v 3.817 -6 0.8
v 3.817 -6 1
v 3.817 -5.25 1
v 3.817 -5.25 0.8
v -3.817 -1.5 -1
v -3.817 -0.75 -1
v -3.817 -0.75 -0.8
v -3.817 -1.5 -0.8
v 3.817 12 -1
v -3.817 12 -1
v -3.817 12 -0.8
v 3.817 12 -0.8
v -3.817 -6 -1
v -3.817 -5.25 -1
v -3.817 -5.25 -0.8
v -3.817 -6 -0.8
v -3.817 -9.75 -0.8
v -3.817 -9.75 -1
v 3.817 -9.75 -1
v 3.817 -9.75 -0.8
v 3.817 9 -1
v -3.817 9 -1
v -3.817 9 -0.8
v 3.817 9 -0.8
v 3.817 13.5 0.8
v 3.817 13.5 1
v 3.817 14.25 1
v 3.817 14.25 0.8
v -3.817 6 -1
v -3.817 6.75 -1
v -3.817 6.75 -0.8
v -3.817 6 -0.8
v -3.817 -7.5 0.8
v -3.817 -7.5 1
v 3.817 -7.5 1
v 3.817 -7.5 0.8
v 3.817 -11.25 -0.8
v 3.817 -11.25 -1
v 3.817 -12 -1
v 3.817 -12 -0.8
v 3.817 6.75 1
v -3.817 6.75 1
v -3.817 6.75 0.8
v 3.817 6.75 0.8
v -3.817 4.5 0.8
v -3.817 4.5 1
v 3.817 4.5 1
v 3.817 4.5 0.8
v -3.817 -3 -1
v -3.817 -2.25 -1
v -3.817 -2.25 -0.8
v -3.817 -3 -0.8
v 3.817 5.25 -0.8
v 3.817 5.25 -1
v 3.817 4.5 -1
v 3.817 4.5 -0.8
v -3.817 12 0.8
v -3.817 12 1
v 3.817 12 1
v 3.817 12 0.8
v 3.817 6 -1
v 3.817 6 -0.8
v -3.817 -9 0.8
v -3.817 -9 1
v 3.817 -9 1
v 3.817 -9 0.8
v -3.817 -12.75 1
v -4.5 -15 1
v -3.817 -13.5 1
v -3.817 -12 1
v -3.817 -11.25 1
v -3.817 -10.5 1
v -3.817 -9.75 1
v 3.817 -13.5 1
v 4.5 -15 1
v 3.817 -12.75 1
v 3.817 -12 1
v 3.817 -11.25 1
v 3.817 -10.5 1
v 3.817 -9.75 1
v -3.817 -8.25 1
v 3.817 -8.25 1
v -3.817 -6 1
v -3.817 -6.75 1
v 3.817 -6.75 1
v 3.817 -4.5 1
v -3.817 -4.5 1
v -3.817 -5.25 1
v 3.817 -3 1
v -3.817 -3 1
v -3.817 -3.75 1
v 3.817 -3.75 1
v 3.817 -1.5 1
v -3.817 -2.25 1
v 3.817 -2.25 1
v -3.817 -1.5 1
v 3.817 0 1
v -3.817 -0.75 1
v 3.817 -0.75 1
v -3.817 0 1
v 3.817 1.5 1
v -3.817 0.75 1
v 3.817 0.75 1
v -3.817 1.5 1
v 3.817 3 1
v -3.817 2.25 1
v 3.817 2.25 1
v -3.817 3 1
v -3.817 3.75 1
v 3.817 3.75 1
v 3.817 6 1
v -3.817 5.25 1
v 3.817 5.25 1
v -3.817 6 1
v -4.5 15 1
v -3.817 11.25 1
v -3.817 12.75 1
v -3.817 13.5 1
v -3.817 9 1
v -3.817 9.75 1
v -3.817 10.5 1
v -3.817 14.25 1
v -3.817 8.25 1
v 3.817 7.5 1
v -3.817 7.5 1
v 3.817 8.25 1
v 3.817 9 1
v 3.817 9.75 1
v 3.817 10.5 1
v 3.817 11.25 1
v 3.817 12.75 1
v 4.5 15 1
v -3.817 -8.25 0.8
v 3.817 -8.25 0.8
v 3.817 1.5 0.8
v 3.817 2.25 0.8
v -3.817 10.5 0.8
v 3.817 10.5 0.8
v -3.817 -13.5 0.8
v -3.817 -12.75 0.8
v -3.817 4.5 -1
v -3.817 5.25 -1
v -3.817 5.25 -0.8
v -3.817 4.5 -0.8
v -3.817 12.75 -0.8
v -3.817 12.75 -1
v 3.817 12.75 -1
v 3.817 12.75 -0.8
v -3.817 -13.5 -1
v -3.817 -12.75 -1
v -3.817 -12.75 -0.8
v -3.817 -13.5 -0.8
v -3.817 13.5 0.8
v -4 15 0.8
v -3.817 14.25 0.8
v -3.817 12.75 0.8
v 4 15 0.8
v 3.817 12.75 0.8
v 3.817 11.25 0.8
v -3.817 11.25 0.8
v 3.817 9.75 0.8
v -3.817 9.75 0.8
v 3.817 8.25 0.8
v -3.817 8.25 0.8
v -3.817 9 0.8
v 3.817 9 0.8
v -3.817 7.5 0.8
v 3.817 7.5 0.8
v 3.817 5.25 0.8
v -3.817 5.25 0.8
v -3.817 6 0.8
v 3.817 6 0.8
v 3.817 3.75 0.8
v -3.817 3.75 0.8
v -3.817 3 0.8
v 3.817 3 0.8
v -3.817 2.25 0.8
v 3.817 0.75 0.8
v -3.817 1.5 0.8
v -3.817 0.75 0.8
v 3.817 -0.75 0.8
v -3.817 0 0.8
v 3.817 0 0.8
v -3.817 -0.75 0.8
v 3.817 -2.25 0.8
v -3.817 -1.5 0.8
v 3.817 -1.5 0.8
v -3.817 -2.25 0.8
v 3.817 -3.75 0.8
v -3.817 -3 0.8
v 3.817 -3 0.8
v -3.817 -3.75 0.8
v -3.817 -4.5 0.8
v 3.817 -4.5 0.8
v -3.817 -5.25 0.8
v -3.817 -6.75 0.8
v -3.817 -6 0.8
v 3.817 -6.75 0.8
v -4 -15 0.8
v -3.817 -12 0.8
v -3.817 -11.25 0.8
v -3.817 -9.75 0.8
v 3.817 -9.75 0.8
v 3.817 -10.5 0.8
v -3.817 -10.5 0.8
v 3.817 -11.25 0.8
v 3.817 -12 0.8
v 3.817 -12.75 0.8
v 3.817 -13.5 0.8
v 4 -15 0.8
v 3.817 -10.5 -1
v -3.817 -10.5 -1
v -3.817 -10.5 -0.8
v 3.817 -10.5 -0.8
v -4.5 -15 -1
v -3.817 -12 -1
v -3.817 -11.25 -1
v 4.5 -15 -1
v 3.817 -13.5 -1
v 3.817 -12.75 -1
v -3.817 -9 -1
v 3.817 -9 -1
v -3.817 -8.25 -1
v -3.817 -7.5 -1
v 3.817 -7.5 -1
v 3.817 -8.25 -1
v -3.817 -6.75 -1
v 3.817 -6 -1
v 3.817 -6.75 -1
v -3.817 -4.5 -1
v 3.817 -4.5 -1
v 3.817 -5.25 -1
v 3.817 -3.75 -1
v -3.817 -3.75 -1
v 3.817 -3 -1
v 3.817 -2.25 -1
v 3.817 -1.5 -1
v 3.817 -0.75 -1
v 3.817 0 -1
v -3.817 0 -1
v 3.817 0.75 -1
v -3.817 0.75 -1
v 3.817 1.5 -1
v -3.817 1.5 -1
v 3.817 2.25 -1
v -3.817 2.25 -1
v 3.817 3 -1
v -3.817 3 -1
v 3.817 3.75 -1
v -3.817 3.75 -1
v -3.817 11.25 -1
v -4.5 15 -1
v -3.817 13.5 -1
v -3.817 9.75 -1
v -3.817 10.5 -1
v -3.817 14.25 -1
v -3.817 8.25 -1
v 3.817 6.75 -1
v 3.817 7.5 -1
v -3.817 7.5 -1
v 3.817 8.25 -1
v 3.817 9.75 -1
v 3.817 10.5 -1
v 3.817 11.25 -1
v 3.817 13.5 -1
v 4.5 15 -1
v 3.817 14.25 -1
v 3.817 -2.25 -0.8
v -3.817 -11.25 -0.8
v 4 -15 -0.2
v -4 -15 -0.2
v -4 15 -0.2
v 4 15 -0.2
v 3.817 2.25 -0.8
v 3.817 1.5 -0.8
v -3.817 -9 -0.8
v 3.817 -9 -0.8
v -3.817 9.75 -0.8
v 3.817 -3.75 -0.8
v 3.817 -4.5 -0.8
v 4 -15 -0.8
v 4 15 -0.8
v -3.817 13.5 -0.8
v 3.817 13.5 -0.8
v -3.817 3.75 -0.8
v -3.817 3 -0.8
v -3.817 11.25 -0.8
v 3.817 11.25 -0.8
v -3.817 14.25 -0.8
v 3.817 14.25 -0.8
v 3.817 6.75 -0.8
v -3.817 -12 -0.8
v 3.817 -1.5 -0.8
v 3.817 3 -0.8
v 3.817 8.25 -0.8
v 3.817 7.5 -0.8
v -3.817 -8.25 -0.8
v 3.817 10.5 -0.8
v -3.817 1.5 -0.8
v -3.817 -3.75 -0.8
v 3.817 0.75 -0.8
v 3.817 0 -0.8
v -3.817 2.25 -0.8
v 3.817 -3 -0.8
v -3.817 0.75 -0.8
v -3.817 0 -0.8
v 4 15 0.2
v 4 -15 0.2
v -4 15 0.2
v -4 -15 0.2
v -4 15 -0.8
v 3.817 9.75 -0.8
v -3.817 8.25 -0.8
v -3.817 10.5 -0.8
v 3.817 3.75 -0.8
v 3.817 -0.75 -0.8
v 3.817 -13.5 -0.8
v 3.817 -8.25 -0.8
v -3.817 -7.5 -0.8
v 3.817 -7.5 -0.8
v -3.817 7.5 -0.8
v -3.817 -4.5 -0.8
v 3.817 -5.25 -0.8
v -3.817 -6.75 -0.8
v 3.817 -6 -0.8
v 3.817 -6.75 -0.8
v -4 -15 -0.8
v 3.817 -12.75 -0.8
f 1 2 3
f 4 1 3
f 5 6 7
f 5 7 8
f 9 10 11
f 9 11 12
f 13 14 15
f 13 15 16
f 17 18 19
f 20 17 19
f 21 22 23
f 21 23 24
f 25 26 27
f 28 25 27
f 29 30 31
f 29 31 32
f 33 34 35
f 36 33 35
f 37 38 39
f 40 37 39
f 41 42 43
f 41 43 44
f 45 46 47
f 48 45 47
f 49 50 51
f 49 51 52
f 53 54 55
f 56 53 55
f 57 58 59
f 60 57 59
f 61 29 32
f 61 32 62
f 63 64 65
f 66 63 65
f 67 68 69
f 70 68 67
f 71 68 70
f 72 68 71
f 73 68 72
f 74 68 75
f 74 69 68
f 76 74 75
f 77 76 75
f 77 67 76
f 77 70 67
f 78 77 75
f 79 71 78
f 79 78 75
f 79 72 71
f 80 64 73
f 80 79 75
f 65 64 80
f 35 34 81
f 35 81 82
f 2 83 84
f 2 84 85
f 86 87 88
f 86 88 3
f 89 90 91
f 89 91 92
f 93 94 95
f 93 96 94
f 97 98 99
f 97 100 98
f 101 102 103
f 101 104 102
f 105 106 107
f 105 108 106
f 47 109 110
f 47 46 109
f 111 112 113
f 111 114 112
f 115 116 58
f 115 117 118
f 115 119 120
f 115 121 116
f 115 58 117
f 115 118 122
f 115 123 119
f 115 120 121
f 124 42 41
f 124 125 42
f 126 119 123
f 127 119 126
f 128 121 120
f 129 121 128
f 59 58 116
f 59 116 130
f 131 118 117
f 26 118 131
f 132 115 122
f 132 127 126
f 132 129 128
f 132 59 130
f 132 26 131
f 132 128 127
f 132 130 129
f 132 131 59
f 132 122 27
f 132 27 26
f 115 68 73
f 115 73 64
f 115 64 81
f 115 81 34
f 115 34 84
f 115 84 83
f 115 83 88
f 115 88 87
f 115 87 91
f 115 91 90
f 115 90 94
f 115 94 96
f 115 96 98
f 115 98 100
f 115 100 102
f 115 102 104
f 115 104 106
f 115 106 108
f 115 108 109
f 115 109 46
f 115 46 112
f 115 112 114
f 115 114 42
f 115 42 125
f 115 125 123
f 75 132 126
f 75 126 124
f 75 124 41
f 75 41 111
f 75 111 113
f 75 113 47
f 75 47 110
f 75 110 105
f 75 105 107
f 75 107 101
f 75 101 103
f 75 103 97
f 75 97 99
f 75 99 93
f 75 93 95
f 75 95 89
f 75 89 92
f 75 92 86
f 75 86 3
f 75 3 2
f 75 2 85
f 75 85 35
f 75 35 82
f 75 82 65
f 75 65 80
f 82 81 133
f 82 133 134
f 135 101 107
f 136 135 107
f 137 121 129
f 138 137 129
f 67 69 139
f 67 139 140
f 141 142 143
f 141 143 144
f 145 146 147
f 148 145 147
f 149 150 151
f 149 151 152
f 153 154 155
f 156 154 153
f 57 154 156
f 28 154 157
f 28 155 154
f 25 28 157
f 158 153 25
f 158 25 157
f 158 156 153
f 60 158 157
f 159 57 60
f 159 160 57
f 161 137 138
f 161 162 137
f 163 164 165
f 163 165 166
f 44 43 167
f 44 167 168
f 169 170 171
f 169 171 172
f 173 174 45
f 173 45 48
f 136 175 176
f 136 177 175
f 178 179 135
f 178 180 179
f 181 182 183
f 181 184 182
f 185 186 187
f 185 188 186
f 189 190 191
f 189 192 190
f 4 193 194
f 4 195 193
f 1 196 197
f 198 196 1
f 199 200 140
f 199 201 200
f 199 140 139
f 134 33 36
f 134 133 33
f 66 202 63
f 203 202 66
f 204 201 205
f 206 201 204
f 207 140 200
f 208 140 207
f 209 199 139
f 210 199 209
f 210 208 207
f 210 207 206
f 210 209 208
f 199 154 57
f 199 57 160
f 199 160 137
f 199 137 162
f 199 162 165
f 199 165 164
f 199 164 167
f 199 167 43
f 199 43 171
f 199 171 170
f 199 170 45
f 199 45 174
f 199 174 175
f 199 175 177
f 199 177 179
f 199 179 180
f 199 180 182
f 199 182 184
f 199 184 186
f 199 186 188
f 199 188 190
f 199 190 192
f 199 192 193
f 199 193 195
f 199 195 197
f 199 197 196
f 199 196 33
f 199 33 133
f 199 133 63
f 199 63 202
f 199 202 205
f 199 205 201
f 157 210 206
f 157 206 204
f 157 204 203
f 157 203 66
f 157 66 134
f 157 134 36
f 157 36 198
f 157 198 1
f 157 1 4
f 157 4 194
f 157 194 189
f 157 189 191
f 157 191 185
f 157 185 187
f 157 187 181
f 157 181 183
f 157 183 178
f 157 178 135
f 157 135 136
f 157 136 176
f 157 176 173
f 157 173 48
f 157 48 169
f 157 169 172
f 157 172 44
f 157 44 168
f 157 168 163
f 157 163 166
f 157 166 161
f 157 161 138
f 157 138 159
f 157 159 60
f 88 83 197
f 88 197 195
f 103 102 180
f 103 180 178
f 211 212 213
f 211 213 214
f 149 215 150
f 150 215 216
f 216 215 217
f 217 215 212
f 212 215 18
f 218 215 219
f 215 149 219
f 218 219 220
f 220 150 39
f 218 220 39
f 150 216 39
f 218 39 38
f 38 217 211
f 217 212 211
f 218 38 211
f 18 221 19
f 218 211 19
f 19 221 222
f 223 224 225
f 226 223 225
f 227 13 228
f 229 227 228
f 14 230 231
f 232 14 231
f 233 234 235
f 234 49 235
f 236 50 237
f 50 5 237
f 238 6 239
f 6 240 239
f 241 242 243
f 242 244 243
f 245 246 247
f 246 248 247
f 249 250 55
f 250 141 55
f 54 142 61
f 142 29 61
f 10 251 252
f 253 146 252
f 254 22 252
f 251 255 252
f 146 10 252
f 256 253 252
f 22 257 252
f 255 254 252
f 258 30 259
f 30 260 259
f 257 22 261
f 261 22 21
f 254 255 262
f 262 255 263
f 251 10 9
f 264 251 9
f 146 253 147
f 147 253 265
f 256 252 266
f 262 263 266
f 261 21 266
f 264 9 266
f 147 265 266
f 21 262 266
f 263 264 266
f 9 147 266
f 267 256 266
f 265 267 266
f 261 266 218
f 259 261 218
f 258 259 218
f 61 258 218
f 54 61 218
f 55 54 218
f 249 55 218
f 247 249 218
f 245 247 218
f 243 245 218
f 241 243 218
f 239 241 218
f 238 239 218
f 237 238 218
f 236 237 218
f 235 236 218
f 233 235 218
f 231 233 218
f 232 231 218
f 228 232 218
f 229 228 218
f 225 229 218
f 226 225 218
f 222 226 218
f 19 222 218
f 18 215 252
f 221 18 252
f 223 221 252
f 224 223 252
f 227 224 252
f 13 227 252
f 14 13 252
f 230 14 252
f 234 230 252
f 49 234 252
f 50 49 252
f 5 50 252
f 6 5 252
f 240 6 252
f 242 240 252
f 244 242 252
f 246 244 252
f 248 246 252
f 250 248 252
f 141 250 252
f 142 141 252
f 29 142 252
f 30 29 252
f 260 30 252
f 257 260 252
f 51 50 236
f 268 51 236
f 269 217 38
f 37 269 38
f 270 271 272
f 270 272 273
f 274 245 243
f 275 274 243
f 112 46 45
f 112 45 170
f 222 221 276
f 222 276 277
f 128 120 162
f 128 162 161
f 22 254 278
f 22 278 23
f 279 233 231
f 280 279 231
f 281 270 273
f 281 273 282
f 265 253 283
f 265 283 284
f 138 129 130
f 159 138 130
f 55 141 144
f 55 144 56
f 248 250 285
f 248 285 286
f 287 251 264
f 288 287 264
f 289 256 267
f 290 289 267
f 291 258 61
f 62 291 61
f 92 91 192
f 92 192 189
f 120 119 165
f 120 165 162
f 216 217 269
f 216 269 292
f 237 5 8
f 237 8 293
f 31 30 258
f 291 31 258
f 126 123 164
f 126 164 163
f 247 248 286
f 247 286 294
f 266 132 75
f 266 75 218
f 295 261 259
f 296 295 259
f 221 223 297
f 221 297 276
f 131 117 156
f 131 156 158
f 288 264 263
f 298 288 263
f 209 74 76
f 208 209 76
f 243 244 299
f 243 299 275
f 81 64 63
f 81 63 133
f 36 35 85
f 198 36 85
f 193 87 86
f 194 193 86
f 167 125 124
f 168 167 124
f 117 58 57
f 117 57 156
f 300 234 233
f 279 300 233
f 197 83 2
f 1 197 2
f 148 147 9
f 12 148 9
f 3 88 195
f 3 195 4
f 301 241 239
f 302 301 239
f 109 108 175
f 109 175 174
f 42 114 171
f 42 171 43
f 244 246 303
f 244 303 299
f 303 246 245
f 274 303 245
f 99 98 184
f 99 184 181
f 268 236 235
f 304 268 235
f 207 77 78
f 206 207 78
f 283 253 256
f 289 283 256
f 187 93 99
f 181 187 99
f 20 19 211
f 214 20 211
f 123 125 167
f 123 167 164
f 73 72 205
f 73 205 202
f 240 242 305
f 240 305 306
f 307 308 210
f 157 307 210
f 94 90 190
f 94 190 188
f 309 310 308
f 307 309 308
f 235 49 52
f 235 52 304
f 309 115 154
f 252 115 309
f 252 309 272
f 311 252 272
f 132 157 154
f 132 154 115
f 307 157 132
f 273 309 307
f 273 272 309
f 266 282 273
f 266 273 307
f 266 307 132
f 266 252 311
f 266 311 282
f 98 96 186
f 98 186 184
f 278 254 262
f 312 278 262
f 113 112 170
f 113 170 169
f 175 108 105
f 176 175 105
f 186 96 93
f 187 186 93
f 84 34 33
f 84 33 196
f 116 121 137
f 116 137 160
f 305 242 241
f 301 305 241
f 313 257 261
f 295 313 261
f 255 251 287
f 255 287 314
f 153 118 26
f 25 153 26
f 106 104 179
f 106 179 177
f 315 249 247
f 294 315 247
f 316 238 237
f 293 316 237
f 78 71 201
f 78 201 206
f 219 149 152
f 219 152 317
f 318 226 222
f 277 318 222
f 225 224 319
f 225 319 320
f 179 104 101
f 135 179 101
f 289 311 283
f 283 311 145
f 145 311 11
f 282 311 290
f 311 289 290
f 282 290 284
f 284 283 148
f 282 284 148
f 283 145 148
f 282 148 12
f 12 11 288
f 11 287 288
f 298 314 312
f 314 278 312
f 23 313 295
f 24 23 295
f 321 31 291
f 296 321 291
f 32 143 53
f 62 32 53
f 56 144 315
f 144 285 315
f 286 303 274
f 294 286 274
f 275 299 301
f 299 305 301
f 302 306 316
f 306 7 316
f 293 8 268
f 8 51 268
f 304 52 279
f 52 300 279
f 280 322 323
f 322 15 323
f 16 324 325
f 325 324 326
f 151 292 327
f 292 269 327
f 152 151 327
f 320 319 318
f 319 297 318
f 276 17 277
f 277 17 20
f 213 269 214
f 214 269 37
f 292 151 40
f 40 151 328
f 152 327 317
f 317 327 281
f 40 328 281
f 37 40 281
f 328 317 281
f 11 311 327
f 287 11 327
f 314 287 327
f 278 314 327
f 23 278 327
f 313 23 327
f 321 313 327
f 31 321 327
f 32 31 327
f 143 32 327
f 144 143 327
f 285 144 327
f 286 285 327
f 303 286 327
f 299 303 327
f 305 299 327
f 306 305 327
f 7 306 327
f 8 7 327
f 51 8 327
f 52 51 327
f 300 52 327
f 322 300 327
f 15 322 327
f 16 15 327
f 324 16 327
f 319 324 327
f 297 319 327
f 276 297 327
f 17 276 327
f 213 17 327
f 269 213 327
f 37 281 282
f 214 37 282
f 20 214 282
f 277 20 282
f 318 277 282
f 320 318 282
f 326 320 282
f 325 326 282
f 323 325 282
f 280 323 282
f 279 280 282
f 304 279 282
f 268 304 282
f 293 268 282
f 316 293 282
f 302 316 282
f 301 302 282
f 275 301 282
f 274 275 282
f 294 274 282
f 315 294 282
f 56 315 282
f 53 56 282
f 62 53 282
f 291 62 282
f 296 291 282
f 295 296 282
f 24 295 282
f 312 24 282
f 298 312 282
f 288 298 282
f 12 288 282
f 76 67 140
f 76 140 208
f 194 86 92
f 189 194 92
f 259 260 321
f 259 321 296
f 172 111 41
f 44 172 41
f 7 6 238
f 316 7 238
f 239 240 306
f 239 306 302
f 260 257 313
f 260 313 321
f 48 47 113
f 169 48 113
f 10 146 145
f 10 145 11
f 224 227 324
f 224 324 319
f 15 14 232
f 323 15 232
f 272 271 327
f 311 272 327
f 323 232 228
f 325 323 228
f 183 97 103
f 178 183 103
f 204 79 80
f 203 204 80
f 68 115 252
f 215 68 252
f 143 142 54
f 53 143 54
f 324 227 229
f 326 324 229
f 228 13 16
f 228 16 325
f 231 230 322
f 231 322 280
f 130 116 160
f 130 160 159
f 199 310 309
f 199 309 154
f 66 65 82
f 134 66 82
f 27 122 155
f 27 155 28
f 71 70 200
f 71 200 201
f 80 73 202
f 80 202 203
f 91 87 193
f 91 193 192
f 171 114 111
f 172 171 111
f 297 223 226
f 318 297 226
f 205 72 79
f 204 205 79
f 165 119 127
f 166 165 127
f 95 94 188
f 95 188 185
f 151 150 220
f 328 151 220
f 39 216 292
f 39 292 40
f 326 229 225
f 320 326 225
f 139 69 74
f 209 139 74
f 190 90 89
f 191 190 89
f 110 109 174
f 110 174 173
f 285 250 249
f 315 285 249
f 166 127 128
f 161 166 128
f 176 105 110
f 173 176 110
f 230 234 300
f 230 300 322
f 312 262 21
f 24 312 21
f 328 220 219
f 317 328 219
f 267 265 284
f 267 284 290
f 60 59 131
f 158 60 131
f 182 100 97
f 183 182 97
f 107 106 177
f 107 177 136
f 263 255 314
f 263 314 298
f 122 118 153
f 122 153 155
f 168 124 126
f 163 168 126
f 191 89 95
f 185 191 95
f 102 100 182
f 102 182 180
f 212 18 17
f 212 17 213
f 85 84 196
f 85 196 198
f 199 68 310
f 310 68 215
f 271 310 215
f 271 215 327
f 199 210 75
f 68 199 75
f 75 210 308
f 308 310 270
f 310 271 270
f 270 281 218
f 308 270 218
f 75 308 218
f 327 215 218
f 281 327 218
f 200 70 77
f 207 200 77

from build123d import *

# Parameters (mm, degrees)
SKETCH1_W                = 9
SKETCH1_H                = 2
BOSS_EXTRUDE1_DEPTH      = 15
CUT_EXTRUDE1_START       = -31
SKETCH2_W                = 8
SKETCH2_H                = 0.6
CUT_EXTRUDE1_DEPTH       = 32
SKETCH3_W                = 7.634272068
SKETCH3_H                = 0.75
CUT_EXTRUDE2_DEPTH       = 0.2
LPATTERN1_COUNT          = 19
LPATTERN1_PITCH          = 1.5
MIRROR2_COPY_1_SKETCH_W  = 7.634272068
MIRROR2_COPY_1_SKETCH_H  = 0.75
MIRROR2_COPY_1_DEPTH     = 0.2
MIRROR2_COPY_2_SKETCH_W  = 7.634272068
MIRROR2_COPY_2_SKETCH_H  = 0.75
MIRROR2_COPY_2_DEPTH     = 0.2
MIRROR2_COPY_3_SKETCH_W  = 7.634272068
MIRROR2_COPY_3_SKETCH_H  = 0.75
MIRROR2_COPY_3_DEPTH     = 0.2
MIRROR2_COPY_4_SKETCH_W  = 7.634272068
MIRROR2_COPY_4_SKETCH_H  = 0.75
MIRROR2_COPY_4_DEPTH     = 0.2
MIRROR2_COPY_5_SKETCH_W  = 7.634272068
MIRROR2_COPY_5_SKETCH_H  = 0.75
MIRROR2_COPY_5_DEPTH     = 0.2
MIRROR2_COPY_6_SKETCH_W  = 7.634272068
MIRROR2_COPY_6_SKETCH_H  = 0.75
MIRROR2_COPY_6_DEPTH     = 0.2
MIRROR2_COPY_7_SKETCH_W  = 7.634272068
MIRROR2_COPY_7_SKETCH_H  = 0.75
MIRROR2_COPY_7_DEPTH     = 0.2
MIRROR2_COPY_8_SKETCH_W  = 7.634272068
MIRROR2_COPY_8_SKETCH_H  = 0.75
MIRROR2_COPY_8_DEPTH     = 0.2
MIRROR2_COPY_9_SKETCH_W  = 7.634272068
MIRROR2_COPY_9_SKETCH_H  = 0.75
MIRROR2_COPY_9_DEPTH     = 0.2
MIRROR2_COPY_10_SKETCH_W = 7.634272068
MIRROR2_COPY_10_SKETCH_H = 0.75
MIRROR2_COPY_10_DEPTH    = 0.2
MIRROR2_COPY_11_SKETCH_W = 7.634272068
MIRROR2_COPY_11_SKETCH_H = 0.75
MIRROR2_COPY_11_DEPTH    = 0.2
MIRROR2_COPY_12_SKETCH_W = 7.634272068
MIRROR2_COPY_12_SKETCH_H = 0.75
MIRROR2_COPY_12_DEPTH    = 0.2
MIRROR2_COPY_13_SKETCH_W = 7.634272068
MIRROR2_COPY_13_SKETCH_H = 0.75
MIRROR2_COPY_13_DEPTH    = 0.2
MIRROR2_COPY_14_SKETCH_W = 7.634272068
MIRROR2_COPY_14_SKETCH_H = 0.75
MIRROR2_COPY_14_DEPTH    = 0.2
MIRROR2_COPY_15_SKETCH_W = 7.634272068
MIRROR2_COPY_15_SKETCH_H = 0.75
MIRROR2_COPY_15_DEPTH    = 0.2
MIRROR2_COPY_16_SKETCH_W = 7.634272068
MIRROR2_COPY_16_SKETCH_H = 0.75
MIRROR2_COPY_16_DEPTH    = 0.2
MIRROR2_COPY_17_SKETCH_W = 7.634272068
MIRROR2_COPY_17_SKETCH_H = 0.75
MIRROR2_COPY_17_DEPTH    = 0.2
MIRROR2_COPY_18_SKETCH_W = 7.634272068
MIRROR2_COPY_18_SKETCH_H = 0.75
MIRROR2_COPY_18_DEPTH    = 0.2


with BuildPart() as part:
    # Sketch1 → Boss-Extrude1 (new body, symmetric)
    with BuildSketch(Plane(origin=(0, 0, 0), x_dir=(1, 0, 0), z_dir=(0, 1, 0))):
        Rectangle(SKETCH1_W, SKETCH1_H)
    extrude(amount=BOSS_EXTRUDE1_DEPTH, both=True)

    # Sketch2 → Cut-Extrude1 (cut)
    with BuildSketch(Plane(origin=(0, 15, 0), x_dir=(1, 0, 0), z_dir=(0, 1, 0)).offset(CUT_EXTRUDE1_START)):
        with Locations((0, 0.5)):
            Rectangle(SKETCH2_W, SKETCH2_H)
    cut_extrude1 = extrude(amount=CUT_EXTRUDE1_DEPTH, mode=Mode.SUBTRACT)

    # Mirror1: Cut-Extrude1 across plane
    add(cut_extrude1.mirror(Plane.XY), mode=Mode.SUBTRACT)

    # Sketch3 → Cut-Extrude2 (cut)
    with BuildSketch(Plane.XY.offset(1)):
        with Locations((0, 13.875)):
            Rectangle(SKETCH3_W, SKETCH3_H)
    cut_extrude2 = extrude(amount=-CUT_EXTRUDE2_DEPTH, mode=Mode.SUBTRACT)

    # LPattern1: Cut-Extrude2 ×19
    with Locations(*[(0, -i * LPATTERN1_PITCH, 0) for i in range(1, LPATTERN1_COUNT)]):
        add(cut_extrude2, mode=Mode.SUBTRACT)

    # Mirror2: Cut-Extrude2 across plane
    add(cut_extrude2.mirror(Plane.XY), mode=Mode.SUBTRACT)

    # Mirror2 copy 1 sketch → Mirror2 copy 1 (cut)
    with BuildSketch(Plane(origin=(0, -1.5, -1), x_dir=(1, 0, 0), z_dir=(0, 0, -1))):
        with Locations((0, -13.875)):
            Rectangle(MIRROR2_COPY_1_SKETCH_W, MIRROR2_COPY_1_SKETCH_H)
    extrude(amount=-MIRROR2_COPY_1_DEPTH, mode=Mode.SUBTRACT)

    # Mirror2 copy 2 sketch → Mirror2 copy 2 (cut)
    with BuildSketch(Plane(origin=(0, -3, -1), x_dir=(1, 0, 0), z_dir=(0, 0, -1))):
        with Locations((0, -13.875)):
            Rectangle(MIRROR2_COPY_2_SKETCH_W, MIRROR2_COPY_2_SKETCH_H)
    extrude(amount=-MIRROR2_COPY_2_DEPTH, mode=Mode.SUBTRACT)

    # Mirror2 copy 3 sketch → Mirror2 copy 3 (cut)
    with BuildSketch(Plane(origin=(0, -4.5, -1), x_dir=(1, 0, 0), z_dir=(0, 0, -1))):
        with Locations((0, -13.875)):
            Rectangle(MIRROR2_COPY_3_SKETCH_W, MIRROR2_COPY_3_SKETCH_H)
    extrude(amount=-MIRROR2_COPY_3_DEPTH, mode=Mode.SUBTRACT)

    # Mirror2 copy 4 sketch → Mirror2 copy 4 (cut)
    with BuildSketch(Plane(origin=(0, -6, -1), x_dir=(1, 0, 0), z_dir=(0, 0, -1))):
        with Locations((0, -13.875)):
            Rectangle(MIRROR2_COPY_4_SKETCH_W, MIRROR2_COPY_4_SKETCH_H)
    extrude(amount=-MIRROR2_COPY_4_DEPTH, mode=Mode.SUBTRACT)

    # Mirror2 copy 5 sketch → Mirror2 copy 5 (cut)
    with BuildSketch(Plane(origin=(0, -7.5, -1), x_dir=(1, 0, 0), z_dir=(0, 0, -1))):
        with Locations((0, -13.875)):
            Rectangle(MIRROR2_COPY_5_SKETCH_W, MIRROR2_COPY_5_SKETCH_H)
    extrude(amount=-MIRROR2_COPY_5_DEPTH, mode=Mode.SUBTRACT)

    # Mirror2 copy 6 sketch → Mirror2 copy 6 (cut)
    with BuildSketch(Plane(origin=(0, -9, -1), x_dir=(1, 0, 0), z_dir=(0, 0, -1))):
        with Locations((0, -13.875)):
            Rectangle(MIRROR2_COPY_6_SKETCH_W, MIRROR2_COPY_6_SKETCH_H)
    extrude(amount=-MIRROR2_COPY_6_DEPTH, mode=Mode.SUBTRACT)

    # Mirror2 copy 7 sketch → Mirror2 copy 7 (cut)
    with BuildSketch(Plane(origin=(0, -10.5, -1), x_dir=(1, 0, 0), z_dir=(0, 0, -1))):
        with Locations((0, -13.875)):
            Rectangle(MIRROR2_COPY_7_SKETCH_W, MIRROR2_COPY_7_SKETCH_H)
    extrude(amount=-MIRROR2_COPY_7_DEPTH, mode=Mode.SUBTRACT)

    # Mirror2 copy 8 sketch → Mirror2 copy 8 (cut)
    with BuildSketch(Plane(origin=(0, -12, -1), x_dir=(1, 0, 0), z_dir=(0, 0, -1))):
        with Locations((0, -13.875)):
            Rectangle(MIRROR2_COPY_8_SKETCH_W, MIRROR2_COPY_8_SKETCH_H)
    extrude(amount=-MIRROR2_COPY_8_DEPTH, mode=Mode.SUBTRACT)

    # Mirror2 copy 9 sketch → Mirror2 copy 9 (cut)
    with BuildSketch(Plane(origin=(0, -13.5, -1), x_dir=(1, 0, 0), z_dir=(0, 0, -1))):
        with Locations((0, -13.875)):
            Rectangle(MIRROR2_COPY_9_SKETCH_W, MIRROR2_COPY_9_SKETCH_H)
    extrude(amount=-MIRROR2_COPY_9_DEPTH, mode=Mode.SUBTRACT)

    # Mirror2 copy 10 sketch → Mirror2 copy 10 (cut)
    with BuildSketch(Plane(origin=(0, -15, -1), x_dir=(1, 0, 0), z_dir=(0, 0, -1))):
        with Locations((0, -13.875)):
            Rectangle(MIRROR2_COPY_10_SKETCH_W, MIRROR2_COPY_10_SKETCH_H)
    extrude(amount=-MIRROR2_COPY_10_DEPTH, mode=Mode.SUBTRACT)

    # Mirror2 copy 11 sketch → Mirror2 copy 11 (cut)
    with BuildSketch(Plane(origin=(0, -16.5, -1), x_dir=(1, 0, 0), z_dir=(0, 0, -1))):
        with Locations((0, -13.875)):
            Rectangle(MIRROR2_COPY_11_SKETCH_W, MIRROR2_COPY_11_SKETCH_H)
    extrude(amount=-MIRROR2_COPY_11_DEPTH, mode=Mode.SUBTRACT)

    # Mirror2 copy 12 sketch → Mirror2 copy 12 (cut)
    with BuildSketch(Plane(origin=(0, -18, -1), x_dir=(1, 0, 0), z_dir=(0, 0, -1))):
        with Locations((0, -13.875)):
            Rectangle(MIRROR2_COPY_12_SKETCH_W, MIRROR2_COPY_12_SKETCH_H)
    extrude(amount=-MIRROR2_COPY_12_DEPTH, mode=Mode.SUBTRACT)

    # Mirror2 copy 13 sketch → Mirror2 copy 13 (cut)
    with BuildSketch(Plane(origin=(0, -19.5, -1), x_dir=(1, 0, 0), z_dir=(0, 0, -1))):
        with Locations((0, -13.875)):
            Rectangle(MIRROR2_COPY_13_SKETCH_W, MIRROR2_COPY_13_SKETCH_H)
    extrude(amount=-MIRROR2_COPY_13_DEPTH, mode=Mode.SUBTRACT)

    # Mirror2 copy 14 sketch → Mirror2 copy 14 (cut)
    with BuildSketch(Plane(origin=(0, -21, -1), x_dir=(1, 0, 0), z_dir=(0, 0, -1))):
        with Locations((0, -13.875)):
            Rectangle(MIRROR2_COPY_14_SKETCH_W, MIRROR2_COPY_14_SKETCH_H)
    extrude(amount=-MIRROR2_COPY_14_DEPTH, mode=Mode.SUBTRACT)

    # Mirror2 copy 15 sketch → Mirror2 copy 15 (cut)
    with BuildSketch(Plane(origin=(0, -22.5, -1), x_dir=(1, 0, 0), z_dir=(0, 0, -1))):
        with Locations((0, -13.875)):
            Rectangle(MIRROR2_COPY_15_SKETCH_W, MIRROR2_COPY_15_SKETCH_H)
    extrude(amount=-MIRROR2_COPY_15_DEPTH, mode=Mode.SUBTRACT)

    # Mirror2 copy 16 sketch → Mirror2 copy 16 (cut)
    with BuildSketch(Plane(origin=(0, -24, -1), x_dir=(1, 0, 0), z_dir=(0, 0, -1))):
        with Locations((0, -13.875)):
            Rectangle(MIRROR2_COPY_16_SKETCH_W, MIRROR2_COPY_16_SKETCH_H)
    extrude(amount=-MIRROR2_COPY_16_DEPTH, mode=Mode.SUBTRACT)

    # Mirror2 copy 17 sketch → Mirror2 copy 17 (cut)
    with BuildSketch(Plane(origin=(0, -25.5, -1), x_dir=(1, 0, 0), z_dir=(0, 0, -1))):
        with Locations((0, -13.875)):
            Rectangle(MIRROR2_COPY_17_SKETCH_W, MIRROR2_COPY_17_SKETCH_H)
    extrude(amount=-MIRROR2_COPY_17_DEPTH, mode=Mode.SUBTRACT)

    # Mirror2 copy 18 sketch → Mirror2 copy 18 (cut)
    with BuildSketch(Plane(origin=(0, -27, -1), x_dir=(1, 0, 0), z_dir=(0, 0, -1))):
        with Locations((0, -13.875)):
            Rectangle(MIRROR2_COPY_18_SKETCH_W, MIRROR2_COPY_18_SKETCH_H)
    extrude(amount=-MIRROR2_COPY_18_DEPTH, mode=Mode.SUBTRACT)


solid = part.part
